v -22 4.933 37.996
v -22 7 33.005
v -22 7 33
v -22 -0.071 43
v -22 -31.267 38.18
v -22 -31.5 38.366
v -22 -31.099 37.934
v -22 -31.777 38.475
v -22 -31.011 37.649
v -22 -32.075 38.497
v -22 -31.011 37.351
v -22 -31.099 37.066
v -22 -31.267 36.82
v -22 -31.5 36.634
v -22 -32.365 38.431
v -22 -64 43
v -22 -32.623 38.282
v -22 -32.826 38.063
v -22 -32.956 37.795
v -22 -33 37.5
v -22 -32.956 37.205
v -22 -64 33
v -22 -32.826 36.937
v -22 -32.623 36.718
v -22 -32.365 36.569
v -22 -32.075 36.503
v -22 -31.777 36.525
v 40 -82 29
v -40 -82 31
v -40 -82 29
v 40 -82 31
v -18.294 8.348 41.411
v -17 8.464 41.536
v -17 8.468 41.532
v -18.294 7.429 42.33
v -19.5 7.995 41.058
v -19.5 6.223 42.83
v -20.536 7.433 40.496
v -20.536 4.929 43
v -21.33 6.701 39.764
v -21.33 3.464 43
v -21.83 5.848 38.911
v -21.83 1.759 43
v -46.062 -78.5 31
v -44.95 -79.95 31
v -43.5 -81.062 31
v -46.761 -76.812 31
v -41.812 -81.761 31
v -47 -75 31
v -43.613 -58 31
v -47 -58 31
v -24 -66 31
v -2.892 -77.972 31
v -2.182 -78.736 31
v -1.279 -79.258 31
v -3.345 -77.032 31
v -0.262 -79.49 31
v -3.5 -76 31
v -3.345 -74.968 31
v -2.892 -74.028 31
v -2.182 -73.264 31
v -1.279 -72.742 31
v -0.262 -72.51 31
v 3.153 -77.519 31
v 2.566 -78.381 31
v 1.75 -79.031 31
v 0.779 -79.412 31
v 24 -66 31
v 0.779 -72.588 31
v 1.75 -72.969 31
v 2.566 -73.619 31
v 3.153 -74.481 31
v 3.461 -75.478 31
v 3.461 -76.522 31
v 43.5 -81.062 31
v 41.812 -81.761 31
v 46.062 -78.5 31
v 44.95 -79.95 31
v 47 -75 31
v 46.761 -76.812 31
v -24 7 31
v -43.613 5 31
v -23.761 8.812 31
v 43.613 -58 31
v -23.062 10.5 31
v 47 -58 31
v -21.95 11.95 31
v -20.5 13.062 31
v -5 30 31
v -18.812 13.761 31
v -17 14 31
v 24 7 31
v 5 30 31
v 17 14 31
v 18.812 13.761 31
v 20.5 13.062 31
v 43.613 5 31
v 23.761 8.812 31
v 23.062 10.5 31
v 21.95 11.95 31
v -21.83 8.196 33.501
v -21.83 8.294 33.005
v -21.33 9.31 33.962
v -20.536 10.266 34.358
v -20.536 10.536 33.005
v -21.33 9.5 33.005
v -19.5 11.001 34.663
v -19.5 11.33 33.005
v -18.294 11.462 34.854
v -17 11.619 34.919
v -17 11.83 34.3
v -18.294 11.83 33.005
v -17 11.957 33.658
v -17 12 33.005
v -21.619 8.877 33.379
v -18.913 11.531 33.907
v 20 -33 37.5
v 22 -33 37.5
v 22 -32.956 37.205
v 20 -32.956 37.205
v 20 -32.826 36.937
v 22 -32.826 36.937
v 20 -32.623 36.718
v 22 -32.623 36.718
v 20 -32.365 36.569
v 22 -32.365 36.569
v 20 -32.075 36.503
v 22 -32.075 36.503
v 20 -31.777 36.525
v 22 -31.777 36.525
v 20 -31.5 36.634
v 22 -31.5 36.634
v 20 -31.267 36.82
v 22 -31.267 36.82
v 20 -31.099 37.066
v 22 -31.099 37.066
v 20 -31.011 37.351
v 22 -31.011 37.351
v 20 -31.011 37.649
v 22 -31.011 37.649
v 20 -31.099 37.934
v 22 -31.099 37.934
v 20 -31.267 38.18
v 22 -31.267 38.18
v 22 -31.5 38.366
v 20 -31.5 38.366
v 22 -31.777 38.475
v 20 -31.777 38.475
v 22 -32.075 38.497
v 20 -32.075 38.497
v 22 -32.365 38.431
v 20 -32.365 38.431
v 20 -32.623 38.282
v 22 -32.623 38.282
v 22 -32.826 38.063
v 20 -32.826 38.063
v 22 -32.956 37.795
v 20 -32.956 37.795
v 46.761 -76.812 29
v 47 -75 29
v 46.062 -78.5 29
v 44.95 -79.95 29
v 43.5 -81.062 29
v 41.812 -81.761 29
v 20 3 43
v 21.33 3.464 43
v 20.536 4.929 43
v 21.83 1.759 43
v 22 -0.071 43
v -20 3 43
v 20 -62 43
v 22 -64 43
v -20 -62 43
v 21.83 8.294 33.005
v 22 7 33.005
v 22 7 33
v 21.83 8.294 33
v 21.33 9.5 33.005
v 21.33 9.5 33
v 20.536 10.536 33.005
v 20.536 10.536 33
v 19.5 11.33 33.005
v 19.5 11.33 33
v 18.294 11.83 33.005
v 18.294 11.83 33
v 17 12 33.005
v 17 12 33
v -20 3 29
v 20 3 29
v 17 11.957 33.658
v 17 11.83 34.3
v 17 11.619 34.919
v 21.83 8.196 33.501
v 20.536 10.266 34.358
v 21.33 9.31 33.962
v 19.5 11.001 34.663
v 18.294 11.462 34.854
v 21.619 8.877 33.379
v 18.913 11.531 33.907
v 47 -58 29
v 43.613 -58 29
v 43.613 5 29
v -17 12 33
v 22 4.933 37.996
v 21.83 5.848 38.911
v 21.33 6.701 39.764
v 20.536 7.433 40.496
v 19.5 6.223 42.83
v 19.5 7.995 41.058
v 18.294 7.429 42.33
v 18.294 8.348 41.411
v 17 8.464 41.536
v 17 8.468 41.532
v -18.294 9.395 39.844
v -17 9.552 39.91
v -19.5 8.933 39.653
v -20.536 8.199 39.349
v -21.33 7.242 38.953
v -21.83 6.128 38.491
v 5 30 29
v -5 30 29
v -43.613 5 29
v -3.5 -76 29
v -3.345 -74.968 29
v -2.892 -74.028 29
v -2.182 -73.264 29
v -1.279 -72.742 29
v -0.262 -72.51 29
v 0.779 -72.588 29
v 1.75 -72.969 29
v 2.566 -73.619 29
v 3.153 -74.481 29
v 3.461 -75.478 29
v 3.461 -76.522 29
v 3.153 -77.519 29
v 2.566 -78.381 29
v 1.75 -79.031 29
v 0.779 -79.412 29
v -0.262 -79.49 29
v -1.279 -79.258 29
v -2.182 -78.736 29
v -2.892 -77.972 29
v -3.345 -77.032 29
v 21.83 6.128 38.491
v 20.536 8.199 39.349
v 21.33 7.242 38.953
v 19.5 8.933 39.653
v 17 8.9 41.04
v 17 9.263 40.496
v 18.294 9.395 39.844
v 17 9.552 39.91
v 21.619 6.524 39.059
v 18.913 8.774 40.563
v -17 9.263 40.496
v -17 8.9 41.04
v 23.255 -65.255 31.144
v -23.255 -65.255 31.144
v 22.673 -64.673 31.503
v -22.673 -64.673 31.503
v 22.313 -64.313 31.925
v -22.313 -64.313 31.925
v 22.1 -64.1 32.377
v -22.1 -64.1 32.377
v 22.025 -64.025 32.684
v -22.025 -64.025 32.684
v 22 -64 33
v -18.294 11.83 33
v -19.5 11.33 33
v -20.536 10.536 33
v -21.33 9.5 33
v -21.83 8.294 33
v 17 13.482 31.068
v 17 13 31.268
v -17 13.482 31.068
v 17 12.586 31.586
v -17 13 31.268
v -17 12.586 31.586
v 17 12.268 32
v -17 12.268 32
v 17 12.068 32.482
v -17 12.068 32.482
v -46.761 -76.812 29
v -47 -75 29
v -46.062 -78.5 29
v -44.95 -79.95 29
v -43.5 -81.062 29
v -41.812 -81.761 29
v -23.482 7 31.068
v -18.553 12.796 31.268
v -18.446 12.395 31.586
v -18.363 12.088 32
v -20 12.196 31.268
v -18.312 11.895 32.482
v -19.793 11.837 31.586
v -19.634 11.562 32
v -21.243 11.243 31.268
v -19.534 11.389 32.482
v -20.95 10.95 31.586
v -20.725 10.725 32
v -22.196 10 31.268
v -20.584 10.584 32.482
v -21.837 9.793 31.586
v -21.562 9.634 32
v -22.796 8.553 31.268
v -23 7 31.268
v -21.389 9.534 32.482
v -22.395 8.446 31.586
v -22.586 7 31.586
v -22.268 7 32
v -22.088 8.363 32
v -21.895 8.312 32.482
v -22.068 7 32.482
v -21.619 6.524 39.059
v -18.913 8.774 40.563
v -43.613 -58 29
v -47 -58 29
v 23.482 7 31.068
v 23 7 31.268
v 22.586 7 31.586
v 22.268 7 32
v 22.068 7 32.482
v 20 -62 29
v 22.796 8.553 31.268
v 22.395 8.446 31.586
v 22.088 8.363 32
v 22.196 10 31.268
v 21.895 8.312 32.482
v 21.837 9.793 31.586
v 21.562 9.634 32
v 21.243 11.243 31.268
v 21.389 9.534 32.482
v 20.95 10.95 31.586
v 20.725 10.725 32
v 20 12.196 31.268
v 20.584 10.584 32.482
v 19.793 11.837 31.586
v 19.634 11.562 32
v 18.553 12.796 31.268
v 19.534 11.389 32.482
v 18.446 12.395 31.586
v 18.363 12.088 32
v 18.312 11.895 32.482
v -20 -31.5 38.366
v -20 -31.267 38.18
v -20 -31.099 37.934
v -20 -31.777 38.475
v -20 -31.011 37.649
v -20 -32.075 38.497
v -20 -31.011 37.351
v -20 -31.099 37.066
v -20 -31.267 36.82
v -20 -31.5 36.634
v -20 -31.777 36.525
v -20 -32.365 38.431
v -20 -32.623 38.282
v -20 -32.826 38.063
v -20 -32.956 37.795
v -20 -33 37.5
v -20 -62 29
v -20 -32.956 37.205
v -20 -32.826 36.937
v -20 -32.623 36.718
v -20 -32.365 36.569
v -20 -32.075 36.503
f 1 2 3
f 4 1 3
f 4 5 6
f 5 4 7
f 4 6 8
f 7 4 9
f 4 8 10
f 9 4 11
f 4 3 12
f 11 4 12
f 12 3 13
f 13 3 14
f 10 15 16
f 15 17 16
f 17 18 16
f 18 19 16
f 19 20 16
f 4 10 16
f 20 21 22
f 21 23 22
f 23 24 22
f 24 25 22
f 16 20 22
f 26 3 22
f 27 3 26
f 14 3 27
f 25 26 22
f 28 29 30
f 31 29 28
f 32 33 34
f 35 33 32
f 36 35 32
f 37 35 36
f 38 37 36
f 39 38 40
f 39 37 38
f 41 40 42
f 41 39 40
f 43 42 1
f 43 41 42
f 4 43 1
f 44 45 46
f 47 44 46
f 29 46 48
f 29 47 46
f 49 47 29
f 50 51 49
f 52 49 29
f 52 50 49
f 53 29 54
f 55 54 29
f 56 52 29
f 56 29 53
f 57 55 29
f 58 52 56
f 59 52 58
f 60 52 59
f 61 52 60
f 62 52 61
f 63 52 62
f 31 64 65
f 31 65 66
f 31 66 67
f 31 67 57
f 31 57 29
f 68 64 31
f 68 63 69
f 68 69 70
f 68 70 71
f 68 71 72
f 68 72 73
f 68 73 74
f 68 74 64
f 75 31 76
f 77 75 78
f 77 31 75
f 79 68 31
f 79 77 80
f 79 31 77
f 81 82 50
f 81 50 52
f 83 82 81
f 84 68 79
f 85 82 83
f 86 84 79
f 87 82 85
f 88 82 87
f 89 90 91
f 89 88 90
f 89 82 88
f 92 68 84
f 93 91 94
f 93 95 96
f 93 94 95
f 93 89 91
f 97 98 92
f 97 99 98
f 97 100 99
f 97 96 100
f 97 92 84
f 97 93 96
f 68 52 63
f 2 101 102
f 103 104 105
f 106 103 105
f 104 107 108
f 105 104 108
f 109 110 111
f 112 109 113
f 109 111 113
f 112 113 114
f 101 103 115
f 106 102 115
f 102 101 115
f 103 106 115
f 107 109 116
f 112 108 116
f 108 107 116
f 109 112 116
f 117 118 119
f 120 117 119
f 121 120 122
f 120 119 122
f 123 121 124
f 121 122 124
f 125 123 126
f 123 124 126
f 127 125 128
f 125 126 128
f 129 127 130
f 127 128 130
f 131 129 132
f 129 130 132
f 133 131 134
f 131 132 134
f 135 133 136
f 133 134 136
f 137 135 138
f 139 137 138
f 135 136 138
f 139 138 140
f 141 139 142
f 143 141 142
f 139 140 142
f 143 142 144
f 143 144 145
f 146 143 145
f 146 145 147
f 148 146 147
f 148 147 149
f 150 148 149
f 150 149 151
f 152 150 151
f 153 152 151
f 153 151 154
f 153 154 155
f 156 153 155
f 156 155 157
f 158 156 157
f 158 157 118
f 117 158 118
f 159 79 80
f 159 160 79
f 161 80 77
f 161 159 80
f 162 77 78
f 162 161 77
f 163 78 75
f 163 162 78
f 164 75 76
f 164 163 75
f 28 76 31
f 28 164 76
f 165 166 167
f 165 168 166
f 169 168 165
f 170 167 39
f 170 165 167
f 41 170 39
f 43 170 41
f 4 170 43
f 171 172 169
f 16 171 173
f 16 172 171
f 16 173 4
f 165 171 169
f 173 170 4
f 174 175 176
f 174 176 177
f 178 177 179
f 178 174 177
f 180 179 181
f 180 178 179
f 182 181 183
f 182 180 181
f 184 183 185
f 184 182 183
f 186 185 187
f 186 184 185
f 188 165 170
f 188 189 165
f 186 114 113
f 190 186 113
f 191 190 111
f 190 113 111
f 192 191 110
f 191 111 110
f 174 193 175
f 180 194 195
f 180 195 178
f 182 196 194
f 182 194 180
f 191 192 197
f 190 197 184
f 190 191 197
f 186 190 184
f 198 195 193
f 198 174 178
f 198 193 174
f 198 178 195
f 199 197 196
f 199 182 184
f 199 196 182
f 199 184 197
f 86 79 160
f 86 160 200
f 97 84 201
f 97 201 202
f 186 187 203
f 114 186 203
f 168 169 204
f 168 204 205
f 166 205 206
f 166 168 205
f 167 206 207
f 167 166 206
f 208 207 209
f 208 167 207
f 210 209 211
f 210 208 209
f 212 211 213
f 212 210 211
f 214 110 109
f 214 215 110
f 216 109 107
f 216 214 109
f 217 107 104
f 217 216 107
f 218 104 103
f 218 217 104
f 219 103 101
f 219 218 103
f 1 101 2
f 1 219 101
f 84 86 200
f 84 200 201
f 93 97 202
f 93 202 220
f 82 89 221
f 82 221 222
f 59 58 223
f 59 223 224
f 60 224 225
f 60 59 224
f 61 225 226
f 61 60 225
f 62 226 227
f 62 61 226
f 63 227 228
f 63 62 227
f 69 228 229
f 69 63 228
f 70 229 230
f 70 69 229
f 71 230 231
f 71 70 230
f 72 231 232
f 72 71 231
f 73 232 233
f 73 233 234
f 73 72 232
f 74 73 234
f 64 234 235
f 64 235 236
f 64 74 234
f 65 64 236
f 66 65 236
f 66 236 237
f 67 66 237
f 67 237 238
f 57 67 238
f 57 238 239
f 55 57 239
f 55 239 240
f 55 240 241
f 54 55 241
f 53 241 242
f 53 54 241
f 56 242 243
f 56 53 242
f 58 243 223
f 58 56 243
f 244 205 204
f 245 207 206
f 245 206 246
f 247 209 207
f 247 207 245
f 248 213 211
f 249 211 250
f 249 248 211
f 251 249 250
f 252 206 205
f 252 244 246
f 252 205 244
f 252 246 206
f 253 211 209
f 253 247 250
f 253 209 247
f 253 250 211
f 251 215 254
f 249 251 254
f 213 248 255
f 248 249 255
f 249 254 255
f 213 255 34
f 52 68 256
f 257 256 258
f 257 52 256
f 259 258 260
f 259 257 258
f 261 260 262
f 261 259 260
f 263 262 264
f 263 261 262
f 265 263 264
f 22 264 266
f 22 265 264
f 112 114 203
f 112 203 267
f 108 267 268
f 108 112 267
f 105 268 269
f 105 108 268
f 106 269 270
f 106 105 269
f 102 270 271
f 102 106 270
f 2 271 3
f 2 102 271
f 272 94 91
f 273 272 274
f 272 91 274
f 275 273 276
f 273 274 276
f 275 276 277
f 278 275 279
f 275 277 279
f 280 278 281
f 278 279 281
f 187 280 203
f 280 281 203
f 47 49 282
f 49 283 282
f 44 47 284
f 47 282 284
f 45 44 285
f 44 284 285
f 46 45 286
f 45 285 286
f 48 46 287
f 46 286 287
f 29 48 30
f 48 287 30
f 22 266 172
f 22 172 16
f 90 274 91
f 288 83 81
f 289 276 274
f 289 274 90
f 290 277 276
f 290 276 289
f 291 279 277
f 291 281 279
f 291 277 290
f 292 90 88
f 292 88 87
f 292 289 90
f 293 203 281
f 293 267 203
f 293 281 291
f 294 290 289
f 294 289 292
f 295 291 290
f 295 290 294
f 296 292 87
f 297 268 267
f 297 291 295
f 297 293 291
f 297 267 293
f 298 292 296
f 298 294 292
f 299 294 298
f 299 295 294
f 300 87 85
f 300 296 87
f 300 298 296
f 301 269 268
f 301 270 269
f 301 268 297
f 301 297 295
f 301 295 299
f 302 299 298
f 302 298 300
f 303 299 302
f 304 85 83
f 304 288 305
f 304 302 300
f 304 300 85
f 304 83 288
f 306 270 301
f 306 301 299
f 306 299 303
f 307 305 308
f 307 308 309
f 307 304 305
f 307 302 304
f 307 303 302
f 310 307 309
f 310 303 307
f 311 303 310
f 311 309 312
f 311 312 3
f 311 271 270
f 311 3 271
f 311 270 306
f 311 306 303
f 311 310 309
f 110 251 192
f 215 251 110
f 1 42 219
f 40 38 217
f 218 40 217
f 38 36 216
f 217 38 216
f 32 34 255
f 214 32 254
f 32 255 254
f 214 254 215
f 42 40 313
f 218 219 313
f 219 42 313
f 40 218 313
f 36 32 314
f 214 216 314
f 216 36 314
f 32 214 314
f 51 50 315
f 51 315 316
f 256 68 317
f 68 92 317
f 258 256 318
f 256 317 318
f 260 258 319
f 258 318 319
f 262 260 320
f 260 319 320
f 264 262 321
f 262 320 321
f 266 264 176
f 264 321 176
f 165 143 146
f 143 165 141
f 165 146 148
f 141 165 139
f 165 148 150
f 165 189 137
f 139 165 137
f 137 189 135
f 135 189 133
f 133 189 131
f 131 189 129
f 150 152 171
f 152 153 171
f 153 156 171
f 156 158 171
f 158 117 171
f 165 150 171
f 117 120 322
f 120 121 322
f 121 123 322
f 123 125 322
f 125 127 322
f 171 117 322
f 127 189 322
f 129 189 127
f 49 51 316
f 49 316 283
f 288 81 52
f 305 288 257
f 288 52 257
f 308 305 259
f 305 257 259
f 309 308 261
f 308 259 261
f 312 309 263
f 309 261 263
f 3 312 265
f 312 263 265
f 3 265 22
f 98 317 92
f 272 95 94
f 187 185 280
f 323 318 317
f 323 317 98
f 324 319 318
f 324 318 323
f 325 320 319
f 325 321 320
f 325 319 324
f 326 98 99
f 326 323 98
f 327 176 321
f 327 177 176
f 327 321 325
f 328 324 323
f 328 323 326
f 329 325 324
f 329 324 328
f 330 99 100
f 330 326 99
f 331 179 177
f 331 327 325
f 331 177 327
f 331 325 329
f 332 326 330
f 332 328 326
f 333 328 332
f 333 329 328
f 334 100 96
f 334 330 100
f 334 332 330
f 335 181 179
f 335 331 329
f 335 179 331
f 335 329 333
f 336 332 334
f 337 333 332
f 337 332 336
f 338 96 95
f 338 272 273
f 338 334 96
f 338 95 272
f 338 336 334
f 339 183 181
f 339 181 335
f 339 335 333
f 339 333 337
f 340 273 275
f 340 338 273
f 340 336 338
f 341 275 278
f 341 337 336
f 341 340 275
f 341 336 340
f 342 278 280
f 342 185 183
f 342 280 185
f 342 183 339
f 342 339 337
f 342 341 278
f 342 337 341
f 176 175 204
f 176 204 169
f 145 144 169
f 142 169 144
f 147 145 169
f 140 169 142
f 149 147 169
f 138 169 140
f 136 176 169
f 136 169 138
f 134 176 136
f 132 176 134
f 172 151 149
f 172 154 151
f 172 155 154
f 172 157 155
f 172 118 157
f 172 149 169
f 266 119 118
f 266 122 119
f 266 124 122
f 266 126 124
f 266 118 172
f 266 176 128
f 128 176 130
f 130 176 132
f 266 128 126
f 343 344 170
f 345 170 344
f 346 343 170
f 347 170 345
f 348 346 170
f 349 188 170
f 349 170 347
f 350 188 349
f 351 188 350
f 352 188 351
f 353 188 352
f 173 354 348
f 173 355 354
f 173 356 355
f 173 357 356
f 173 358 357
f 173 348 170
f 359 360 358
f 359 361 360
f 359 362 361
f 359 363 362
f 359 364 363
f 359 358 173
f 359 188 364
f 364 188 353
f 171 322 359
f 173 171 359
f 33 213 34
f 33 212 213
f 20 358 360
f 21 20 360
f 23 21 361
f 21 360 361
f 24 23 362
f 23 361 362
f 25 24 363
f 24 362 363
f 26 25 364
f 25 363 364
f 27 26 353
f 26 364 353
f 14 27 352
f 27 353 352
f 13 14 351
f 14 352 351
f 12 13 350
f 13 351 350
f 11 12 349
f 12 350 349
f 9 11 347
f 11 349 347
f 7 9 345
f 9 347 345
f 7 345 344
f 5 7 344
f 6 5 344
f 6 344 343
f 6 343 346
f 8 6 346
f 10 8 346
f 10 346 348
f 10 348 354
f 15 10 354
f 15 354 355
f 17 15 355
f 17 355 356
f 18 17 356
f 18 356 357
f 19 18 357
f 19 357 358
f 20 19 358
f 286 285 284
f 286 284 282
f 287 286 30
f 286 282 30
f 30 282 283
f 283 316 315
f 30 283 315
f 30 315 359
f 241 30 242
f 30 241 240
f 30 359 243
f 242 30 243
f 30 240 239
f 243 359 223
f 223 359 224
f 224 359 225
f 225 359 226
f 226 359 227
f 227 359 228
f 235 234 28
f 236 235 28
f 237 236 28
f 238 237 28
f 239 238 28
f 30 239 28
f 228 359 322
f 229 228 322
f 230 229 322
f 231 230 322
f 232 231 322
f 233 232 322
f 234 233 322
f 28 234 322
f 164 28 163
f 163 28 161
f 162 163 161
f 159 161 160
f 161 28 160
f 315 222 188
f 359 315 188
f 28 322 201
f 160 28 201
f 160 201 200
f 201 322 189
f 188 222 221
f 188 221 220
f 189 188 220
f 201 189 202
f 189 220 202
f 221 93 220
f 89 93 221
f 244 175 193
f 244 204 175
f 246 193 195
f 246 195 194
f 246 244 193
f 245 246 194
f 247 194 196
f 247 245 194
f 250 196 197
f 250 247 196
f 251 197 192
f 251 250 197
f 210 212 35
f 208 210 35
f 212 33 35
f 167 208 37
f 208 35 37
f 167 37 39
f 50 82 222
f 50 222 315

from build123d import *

# Parameters (mm, degrees)
SKETCH007_R             = 3.5
SKETCH007_W             = 40
SKETCH007_H             = 65
PAD003_DEPTH            = 2
SKETCH017_W             = 44
SKETCH017_H             = 76
SKETCH017_W_2           = 40
SKETCH017_H_2           = 65
PAD009_DEPTH            = 12
SKETCH018_R             = 1
POCKET003_DEPTH         = 44
CHAMFER003_SIZE         = 5
CHAMFER004_SIZE         = 4
FILLET012_R             = 5
FILLET013_R             = 7
FILLET014_R             = 2
BODY001_ROLL_ANGLE      = 90
BODY001_PLACEMENT_ANGLE = 180


with BuildPart() as part:
    # Sketch007 → Pad003 (new body)
    with BuildSketch(Plane.XZ):
        Polygon((-5, 30), (5, 30), (43.613469, 5), (43.613469, -58), (47, -58), (47, -82), (-47, -82), (-47, -58), (-43.613469, -58), (-43.613469, 5), align=None)
        with Locations((0, -76)):
            Circle(SKETCH007_R, mode=Mode.SUBTRACT)
        with Locations((0, -29.5)):
            Rectangle(SKETCH007_W, SKETCH007_H, mode=Mode.SUBTRACT)
    extrude(amount=PAD003_DEPTH)

    # Sketch017 (on Face16 of Pad003) → Pad009 (join)
    with BuildSketch(Plane(origin=(0, 0, 0), x_dir=(1, 0, 0), z_dir=(0, 1, 0))):
        with Locations((0, 26)):
            Rectangle(SKETCH017_W, SKETCH017_H)
        with Locations((0, 29.5)):
            Rectangle(SKETCH017_W_2, SKETCH017_H_2, mode=Mode.SUBTRACT)
    extrude(amount=PAD009_DEPTH)

    # Sketch018 (on Face13 of Pad009) → Pocket003 (cut)
    with BuildSketch(Plane(origin=(-22, 0, 0), x_dir=(0, 0, -1), z_dir=(-1, 0, 0))):
        with Locations((32, -6.5)):
            Circle(SKETCH018_R)
    extrude(amount=-POCKET003_DEPTH, mode=Mode.SUBTRACT)

    # Chamfer003
    chamfer003_edges = [part.edges().sort_by_distance(p)[0] for p in [
        (0, 12, 12),
    ]]
    chamfer(chamfer003_edges, length=CHAMFER003_SIZE)

    # Chamfer004
    chamfer004_edges = [part.edges().sort_by_distance(p)[0] for p in [
        (0, 7, 12),
    ]]
    chamfer(chamfer004_edges, length=CHAMFER004_SIZE)

    # Fillet012
    fillet012_edges = [part.edges().sort_by_distance(p)[0] for p in [
        (0, 3, 12),
        (0, 9.828427, 9.171573),
        (0, 12, 7),
        (-22, 10.914214, 8.085786),
        (-22, 6.414214, 10.585786),
        (-22, 1.5, 12),
        (22, 10.914214, 8.085786),
        (22, 6.414214, 10.585786),
        (22, 1.5, 12),
    ]]
    fillet(fillet012_edges, radius=FILLET012_R)

    # Fillet013
    fillet013_edges = [part.edges().sort_by_distance(p)[0] for p in [
        (47, -1, -82),
        (-47, -1, -82),
    ]]
    fillet(fillet013_edges, radius=FILLET013_R)

    # Fillet014
    fillet014_edges = [part.edges().sort_by_distance(p)[0] for p in [
        (0, 0, -64),
        (0, 0, 12),
    ]]
    fillet(fillet014_edges, radius=FILLET014_R)


with BuildPart() as part_1:
    # Body001 roll: moved
    add(part.part.rotate(Axis((0, 0, 0), (1, 0, 0)), BODY001_ROLL_ANGLE))


with BuildPart() as part_2:
    # Body001 placement: moved
    add(part_1.part.moved(Location((0, 0, 31))).rotate(Axis((0, 0, 31), (0, 0, 1)), BODY001_PLACEMENT_ANGLE))


solid = part_2.part
